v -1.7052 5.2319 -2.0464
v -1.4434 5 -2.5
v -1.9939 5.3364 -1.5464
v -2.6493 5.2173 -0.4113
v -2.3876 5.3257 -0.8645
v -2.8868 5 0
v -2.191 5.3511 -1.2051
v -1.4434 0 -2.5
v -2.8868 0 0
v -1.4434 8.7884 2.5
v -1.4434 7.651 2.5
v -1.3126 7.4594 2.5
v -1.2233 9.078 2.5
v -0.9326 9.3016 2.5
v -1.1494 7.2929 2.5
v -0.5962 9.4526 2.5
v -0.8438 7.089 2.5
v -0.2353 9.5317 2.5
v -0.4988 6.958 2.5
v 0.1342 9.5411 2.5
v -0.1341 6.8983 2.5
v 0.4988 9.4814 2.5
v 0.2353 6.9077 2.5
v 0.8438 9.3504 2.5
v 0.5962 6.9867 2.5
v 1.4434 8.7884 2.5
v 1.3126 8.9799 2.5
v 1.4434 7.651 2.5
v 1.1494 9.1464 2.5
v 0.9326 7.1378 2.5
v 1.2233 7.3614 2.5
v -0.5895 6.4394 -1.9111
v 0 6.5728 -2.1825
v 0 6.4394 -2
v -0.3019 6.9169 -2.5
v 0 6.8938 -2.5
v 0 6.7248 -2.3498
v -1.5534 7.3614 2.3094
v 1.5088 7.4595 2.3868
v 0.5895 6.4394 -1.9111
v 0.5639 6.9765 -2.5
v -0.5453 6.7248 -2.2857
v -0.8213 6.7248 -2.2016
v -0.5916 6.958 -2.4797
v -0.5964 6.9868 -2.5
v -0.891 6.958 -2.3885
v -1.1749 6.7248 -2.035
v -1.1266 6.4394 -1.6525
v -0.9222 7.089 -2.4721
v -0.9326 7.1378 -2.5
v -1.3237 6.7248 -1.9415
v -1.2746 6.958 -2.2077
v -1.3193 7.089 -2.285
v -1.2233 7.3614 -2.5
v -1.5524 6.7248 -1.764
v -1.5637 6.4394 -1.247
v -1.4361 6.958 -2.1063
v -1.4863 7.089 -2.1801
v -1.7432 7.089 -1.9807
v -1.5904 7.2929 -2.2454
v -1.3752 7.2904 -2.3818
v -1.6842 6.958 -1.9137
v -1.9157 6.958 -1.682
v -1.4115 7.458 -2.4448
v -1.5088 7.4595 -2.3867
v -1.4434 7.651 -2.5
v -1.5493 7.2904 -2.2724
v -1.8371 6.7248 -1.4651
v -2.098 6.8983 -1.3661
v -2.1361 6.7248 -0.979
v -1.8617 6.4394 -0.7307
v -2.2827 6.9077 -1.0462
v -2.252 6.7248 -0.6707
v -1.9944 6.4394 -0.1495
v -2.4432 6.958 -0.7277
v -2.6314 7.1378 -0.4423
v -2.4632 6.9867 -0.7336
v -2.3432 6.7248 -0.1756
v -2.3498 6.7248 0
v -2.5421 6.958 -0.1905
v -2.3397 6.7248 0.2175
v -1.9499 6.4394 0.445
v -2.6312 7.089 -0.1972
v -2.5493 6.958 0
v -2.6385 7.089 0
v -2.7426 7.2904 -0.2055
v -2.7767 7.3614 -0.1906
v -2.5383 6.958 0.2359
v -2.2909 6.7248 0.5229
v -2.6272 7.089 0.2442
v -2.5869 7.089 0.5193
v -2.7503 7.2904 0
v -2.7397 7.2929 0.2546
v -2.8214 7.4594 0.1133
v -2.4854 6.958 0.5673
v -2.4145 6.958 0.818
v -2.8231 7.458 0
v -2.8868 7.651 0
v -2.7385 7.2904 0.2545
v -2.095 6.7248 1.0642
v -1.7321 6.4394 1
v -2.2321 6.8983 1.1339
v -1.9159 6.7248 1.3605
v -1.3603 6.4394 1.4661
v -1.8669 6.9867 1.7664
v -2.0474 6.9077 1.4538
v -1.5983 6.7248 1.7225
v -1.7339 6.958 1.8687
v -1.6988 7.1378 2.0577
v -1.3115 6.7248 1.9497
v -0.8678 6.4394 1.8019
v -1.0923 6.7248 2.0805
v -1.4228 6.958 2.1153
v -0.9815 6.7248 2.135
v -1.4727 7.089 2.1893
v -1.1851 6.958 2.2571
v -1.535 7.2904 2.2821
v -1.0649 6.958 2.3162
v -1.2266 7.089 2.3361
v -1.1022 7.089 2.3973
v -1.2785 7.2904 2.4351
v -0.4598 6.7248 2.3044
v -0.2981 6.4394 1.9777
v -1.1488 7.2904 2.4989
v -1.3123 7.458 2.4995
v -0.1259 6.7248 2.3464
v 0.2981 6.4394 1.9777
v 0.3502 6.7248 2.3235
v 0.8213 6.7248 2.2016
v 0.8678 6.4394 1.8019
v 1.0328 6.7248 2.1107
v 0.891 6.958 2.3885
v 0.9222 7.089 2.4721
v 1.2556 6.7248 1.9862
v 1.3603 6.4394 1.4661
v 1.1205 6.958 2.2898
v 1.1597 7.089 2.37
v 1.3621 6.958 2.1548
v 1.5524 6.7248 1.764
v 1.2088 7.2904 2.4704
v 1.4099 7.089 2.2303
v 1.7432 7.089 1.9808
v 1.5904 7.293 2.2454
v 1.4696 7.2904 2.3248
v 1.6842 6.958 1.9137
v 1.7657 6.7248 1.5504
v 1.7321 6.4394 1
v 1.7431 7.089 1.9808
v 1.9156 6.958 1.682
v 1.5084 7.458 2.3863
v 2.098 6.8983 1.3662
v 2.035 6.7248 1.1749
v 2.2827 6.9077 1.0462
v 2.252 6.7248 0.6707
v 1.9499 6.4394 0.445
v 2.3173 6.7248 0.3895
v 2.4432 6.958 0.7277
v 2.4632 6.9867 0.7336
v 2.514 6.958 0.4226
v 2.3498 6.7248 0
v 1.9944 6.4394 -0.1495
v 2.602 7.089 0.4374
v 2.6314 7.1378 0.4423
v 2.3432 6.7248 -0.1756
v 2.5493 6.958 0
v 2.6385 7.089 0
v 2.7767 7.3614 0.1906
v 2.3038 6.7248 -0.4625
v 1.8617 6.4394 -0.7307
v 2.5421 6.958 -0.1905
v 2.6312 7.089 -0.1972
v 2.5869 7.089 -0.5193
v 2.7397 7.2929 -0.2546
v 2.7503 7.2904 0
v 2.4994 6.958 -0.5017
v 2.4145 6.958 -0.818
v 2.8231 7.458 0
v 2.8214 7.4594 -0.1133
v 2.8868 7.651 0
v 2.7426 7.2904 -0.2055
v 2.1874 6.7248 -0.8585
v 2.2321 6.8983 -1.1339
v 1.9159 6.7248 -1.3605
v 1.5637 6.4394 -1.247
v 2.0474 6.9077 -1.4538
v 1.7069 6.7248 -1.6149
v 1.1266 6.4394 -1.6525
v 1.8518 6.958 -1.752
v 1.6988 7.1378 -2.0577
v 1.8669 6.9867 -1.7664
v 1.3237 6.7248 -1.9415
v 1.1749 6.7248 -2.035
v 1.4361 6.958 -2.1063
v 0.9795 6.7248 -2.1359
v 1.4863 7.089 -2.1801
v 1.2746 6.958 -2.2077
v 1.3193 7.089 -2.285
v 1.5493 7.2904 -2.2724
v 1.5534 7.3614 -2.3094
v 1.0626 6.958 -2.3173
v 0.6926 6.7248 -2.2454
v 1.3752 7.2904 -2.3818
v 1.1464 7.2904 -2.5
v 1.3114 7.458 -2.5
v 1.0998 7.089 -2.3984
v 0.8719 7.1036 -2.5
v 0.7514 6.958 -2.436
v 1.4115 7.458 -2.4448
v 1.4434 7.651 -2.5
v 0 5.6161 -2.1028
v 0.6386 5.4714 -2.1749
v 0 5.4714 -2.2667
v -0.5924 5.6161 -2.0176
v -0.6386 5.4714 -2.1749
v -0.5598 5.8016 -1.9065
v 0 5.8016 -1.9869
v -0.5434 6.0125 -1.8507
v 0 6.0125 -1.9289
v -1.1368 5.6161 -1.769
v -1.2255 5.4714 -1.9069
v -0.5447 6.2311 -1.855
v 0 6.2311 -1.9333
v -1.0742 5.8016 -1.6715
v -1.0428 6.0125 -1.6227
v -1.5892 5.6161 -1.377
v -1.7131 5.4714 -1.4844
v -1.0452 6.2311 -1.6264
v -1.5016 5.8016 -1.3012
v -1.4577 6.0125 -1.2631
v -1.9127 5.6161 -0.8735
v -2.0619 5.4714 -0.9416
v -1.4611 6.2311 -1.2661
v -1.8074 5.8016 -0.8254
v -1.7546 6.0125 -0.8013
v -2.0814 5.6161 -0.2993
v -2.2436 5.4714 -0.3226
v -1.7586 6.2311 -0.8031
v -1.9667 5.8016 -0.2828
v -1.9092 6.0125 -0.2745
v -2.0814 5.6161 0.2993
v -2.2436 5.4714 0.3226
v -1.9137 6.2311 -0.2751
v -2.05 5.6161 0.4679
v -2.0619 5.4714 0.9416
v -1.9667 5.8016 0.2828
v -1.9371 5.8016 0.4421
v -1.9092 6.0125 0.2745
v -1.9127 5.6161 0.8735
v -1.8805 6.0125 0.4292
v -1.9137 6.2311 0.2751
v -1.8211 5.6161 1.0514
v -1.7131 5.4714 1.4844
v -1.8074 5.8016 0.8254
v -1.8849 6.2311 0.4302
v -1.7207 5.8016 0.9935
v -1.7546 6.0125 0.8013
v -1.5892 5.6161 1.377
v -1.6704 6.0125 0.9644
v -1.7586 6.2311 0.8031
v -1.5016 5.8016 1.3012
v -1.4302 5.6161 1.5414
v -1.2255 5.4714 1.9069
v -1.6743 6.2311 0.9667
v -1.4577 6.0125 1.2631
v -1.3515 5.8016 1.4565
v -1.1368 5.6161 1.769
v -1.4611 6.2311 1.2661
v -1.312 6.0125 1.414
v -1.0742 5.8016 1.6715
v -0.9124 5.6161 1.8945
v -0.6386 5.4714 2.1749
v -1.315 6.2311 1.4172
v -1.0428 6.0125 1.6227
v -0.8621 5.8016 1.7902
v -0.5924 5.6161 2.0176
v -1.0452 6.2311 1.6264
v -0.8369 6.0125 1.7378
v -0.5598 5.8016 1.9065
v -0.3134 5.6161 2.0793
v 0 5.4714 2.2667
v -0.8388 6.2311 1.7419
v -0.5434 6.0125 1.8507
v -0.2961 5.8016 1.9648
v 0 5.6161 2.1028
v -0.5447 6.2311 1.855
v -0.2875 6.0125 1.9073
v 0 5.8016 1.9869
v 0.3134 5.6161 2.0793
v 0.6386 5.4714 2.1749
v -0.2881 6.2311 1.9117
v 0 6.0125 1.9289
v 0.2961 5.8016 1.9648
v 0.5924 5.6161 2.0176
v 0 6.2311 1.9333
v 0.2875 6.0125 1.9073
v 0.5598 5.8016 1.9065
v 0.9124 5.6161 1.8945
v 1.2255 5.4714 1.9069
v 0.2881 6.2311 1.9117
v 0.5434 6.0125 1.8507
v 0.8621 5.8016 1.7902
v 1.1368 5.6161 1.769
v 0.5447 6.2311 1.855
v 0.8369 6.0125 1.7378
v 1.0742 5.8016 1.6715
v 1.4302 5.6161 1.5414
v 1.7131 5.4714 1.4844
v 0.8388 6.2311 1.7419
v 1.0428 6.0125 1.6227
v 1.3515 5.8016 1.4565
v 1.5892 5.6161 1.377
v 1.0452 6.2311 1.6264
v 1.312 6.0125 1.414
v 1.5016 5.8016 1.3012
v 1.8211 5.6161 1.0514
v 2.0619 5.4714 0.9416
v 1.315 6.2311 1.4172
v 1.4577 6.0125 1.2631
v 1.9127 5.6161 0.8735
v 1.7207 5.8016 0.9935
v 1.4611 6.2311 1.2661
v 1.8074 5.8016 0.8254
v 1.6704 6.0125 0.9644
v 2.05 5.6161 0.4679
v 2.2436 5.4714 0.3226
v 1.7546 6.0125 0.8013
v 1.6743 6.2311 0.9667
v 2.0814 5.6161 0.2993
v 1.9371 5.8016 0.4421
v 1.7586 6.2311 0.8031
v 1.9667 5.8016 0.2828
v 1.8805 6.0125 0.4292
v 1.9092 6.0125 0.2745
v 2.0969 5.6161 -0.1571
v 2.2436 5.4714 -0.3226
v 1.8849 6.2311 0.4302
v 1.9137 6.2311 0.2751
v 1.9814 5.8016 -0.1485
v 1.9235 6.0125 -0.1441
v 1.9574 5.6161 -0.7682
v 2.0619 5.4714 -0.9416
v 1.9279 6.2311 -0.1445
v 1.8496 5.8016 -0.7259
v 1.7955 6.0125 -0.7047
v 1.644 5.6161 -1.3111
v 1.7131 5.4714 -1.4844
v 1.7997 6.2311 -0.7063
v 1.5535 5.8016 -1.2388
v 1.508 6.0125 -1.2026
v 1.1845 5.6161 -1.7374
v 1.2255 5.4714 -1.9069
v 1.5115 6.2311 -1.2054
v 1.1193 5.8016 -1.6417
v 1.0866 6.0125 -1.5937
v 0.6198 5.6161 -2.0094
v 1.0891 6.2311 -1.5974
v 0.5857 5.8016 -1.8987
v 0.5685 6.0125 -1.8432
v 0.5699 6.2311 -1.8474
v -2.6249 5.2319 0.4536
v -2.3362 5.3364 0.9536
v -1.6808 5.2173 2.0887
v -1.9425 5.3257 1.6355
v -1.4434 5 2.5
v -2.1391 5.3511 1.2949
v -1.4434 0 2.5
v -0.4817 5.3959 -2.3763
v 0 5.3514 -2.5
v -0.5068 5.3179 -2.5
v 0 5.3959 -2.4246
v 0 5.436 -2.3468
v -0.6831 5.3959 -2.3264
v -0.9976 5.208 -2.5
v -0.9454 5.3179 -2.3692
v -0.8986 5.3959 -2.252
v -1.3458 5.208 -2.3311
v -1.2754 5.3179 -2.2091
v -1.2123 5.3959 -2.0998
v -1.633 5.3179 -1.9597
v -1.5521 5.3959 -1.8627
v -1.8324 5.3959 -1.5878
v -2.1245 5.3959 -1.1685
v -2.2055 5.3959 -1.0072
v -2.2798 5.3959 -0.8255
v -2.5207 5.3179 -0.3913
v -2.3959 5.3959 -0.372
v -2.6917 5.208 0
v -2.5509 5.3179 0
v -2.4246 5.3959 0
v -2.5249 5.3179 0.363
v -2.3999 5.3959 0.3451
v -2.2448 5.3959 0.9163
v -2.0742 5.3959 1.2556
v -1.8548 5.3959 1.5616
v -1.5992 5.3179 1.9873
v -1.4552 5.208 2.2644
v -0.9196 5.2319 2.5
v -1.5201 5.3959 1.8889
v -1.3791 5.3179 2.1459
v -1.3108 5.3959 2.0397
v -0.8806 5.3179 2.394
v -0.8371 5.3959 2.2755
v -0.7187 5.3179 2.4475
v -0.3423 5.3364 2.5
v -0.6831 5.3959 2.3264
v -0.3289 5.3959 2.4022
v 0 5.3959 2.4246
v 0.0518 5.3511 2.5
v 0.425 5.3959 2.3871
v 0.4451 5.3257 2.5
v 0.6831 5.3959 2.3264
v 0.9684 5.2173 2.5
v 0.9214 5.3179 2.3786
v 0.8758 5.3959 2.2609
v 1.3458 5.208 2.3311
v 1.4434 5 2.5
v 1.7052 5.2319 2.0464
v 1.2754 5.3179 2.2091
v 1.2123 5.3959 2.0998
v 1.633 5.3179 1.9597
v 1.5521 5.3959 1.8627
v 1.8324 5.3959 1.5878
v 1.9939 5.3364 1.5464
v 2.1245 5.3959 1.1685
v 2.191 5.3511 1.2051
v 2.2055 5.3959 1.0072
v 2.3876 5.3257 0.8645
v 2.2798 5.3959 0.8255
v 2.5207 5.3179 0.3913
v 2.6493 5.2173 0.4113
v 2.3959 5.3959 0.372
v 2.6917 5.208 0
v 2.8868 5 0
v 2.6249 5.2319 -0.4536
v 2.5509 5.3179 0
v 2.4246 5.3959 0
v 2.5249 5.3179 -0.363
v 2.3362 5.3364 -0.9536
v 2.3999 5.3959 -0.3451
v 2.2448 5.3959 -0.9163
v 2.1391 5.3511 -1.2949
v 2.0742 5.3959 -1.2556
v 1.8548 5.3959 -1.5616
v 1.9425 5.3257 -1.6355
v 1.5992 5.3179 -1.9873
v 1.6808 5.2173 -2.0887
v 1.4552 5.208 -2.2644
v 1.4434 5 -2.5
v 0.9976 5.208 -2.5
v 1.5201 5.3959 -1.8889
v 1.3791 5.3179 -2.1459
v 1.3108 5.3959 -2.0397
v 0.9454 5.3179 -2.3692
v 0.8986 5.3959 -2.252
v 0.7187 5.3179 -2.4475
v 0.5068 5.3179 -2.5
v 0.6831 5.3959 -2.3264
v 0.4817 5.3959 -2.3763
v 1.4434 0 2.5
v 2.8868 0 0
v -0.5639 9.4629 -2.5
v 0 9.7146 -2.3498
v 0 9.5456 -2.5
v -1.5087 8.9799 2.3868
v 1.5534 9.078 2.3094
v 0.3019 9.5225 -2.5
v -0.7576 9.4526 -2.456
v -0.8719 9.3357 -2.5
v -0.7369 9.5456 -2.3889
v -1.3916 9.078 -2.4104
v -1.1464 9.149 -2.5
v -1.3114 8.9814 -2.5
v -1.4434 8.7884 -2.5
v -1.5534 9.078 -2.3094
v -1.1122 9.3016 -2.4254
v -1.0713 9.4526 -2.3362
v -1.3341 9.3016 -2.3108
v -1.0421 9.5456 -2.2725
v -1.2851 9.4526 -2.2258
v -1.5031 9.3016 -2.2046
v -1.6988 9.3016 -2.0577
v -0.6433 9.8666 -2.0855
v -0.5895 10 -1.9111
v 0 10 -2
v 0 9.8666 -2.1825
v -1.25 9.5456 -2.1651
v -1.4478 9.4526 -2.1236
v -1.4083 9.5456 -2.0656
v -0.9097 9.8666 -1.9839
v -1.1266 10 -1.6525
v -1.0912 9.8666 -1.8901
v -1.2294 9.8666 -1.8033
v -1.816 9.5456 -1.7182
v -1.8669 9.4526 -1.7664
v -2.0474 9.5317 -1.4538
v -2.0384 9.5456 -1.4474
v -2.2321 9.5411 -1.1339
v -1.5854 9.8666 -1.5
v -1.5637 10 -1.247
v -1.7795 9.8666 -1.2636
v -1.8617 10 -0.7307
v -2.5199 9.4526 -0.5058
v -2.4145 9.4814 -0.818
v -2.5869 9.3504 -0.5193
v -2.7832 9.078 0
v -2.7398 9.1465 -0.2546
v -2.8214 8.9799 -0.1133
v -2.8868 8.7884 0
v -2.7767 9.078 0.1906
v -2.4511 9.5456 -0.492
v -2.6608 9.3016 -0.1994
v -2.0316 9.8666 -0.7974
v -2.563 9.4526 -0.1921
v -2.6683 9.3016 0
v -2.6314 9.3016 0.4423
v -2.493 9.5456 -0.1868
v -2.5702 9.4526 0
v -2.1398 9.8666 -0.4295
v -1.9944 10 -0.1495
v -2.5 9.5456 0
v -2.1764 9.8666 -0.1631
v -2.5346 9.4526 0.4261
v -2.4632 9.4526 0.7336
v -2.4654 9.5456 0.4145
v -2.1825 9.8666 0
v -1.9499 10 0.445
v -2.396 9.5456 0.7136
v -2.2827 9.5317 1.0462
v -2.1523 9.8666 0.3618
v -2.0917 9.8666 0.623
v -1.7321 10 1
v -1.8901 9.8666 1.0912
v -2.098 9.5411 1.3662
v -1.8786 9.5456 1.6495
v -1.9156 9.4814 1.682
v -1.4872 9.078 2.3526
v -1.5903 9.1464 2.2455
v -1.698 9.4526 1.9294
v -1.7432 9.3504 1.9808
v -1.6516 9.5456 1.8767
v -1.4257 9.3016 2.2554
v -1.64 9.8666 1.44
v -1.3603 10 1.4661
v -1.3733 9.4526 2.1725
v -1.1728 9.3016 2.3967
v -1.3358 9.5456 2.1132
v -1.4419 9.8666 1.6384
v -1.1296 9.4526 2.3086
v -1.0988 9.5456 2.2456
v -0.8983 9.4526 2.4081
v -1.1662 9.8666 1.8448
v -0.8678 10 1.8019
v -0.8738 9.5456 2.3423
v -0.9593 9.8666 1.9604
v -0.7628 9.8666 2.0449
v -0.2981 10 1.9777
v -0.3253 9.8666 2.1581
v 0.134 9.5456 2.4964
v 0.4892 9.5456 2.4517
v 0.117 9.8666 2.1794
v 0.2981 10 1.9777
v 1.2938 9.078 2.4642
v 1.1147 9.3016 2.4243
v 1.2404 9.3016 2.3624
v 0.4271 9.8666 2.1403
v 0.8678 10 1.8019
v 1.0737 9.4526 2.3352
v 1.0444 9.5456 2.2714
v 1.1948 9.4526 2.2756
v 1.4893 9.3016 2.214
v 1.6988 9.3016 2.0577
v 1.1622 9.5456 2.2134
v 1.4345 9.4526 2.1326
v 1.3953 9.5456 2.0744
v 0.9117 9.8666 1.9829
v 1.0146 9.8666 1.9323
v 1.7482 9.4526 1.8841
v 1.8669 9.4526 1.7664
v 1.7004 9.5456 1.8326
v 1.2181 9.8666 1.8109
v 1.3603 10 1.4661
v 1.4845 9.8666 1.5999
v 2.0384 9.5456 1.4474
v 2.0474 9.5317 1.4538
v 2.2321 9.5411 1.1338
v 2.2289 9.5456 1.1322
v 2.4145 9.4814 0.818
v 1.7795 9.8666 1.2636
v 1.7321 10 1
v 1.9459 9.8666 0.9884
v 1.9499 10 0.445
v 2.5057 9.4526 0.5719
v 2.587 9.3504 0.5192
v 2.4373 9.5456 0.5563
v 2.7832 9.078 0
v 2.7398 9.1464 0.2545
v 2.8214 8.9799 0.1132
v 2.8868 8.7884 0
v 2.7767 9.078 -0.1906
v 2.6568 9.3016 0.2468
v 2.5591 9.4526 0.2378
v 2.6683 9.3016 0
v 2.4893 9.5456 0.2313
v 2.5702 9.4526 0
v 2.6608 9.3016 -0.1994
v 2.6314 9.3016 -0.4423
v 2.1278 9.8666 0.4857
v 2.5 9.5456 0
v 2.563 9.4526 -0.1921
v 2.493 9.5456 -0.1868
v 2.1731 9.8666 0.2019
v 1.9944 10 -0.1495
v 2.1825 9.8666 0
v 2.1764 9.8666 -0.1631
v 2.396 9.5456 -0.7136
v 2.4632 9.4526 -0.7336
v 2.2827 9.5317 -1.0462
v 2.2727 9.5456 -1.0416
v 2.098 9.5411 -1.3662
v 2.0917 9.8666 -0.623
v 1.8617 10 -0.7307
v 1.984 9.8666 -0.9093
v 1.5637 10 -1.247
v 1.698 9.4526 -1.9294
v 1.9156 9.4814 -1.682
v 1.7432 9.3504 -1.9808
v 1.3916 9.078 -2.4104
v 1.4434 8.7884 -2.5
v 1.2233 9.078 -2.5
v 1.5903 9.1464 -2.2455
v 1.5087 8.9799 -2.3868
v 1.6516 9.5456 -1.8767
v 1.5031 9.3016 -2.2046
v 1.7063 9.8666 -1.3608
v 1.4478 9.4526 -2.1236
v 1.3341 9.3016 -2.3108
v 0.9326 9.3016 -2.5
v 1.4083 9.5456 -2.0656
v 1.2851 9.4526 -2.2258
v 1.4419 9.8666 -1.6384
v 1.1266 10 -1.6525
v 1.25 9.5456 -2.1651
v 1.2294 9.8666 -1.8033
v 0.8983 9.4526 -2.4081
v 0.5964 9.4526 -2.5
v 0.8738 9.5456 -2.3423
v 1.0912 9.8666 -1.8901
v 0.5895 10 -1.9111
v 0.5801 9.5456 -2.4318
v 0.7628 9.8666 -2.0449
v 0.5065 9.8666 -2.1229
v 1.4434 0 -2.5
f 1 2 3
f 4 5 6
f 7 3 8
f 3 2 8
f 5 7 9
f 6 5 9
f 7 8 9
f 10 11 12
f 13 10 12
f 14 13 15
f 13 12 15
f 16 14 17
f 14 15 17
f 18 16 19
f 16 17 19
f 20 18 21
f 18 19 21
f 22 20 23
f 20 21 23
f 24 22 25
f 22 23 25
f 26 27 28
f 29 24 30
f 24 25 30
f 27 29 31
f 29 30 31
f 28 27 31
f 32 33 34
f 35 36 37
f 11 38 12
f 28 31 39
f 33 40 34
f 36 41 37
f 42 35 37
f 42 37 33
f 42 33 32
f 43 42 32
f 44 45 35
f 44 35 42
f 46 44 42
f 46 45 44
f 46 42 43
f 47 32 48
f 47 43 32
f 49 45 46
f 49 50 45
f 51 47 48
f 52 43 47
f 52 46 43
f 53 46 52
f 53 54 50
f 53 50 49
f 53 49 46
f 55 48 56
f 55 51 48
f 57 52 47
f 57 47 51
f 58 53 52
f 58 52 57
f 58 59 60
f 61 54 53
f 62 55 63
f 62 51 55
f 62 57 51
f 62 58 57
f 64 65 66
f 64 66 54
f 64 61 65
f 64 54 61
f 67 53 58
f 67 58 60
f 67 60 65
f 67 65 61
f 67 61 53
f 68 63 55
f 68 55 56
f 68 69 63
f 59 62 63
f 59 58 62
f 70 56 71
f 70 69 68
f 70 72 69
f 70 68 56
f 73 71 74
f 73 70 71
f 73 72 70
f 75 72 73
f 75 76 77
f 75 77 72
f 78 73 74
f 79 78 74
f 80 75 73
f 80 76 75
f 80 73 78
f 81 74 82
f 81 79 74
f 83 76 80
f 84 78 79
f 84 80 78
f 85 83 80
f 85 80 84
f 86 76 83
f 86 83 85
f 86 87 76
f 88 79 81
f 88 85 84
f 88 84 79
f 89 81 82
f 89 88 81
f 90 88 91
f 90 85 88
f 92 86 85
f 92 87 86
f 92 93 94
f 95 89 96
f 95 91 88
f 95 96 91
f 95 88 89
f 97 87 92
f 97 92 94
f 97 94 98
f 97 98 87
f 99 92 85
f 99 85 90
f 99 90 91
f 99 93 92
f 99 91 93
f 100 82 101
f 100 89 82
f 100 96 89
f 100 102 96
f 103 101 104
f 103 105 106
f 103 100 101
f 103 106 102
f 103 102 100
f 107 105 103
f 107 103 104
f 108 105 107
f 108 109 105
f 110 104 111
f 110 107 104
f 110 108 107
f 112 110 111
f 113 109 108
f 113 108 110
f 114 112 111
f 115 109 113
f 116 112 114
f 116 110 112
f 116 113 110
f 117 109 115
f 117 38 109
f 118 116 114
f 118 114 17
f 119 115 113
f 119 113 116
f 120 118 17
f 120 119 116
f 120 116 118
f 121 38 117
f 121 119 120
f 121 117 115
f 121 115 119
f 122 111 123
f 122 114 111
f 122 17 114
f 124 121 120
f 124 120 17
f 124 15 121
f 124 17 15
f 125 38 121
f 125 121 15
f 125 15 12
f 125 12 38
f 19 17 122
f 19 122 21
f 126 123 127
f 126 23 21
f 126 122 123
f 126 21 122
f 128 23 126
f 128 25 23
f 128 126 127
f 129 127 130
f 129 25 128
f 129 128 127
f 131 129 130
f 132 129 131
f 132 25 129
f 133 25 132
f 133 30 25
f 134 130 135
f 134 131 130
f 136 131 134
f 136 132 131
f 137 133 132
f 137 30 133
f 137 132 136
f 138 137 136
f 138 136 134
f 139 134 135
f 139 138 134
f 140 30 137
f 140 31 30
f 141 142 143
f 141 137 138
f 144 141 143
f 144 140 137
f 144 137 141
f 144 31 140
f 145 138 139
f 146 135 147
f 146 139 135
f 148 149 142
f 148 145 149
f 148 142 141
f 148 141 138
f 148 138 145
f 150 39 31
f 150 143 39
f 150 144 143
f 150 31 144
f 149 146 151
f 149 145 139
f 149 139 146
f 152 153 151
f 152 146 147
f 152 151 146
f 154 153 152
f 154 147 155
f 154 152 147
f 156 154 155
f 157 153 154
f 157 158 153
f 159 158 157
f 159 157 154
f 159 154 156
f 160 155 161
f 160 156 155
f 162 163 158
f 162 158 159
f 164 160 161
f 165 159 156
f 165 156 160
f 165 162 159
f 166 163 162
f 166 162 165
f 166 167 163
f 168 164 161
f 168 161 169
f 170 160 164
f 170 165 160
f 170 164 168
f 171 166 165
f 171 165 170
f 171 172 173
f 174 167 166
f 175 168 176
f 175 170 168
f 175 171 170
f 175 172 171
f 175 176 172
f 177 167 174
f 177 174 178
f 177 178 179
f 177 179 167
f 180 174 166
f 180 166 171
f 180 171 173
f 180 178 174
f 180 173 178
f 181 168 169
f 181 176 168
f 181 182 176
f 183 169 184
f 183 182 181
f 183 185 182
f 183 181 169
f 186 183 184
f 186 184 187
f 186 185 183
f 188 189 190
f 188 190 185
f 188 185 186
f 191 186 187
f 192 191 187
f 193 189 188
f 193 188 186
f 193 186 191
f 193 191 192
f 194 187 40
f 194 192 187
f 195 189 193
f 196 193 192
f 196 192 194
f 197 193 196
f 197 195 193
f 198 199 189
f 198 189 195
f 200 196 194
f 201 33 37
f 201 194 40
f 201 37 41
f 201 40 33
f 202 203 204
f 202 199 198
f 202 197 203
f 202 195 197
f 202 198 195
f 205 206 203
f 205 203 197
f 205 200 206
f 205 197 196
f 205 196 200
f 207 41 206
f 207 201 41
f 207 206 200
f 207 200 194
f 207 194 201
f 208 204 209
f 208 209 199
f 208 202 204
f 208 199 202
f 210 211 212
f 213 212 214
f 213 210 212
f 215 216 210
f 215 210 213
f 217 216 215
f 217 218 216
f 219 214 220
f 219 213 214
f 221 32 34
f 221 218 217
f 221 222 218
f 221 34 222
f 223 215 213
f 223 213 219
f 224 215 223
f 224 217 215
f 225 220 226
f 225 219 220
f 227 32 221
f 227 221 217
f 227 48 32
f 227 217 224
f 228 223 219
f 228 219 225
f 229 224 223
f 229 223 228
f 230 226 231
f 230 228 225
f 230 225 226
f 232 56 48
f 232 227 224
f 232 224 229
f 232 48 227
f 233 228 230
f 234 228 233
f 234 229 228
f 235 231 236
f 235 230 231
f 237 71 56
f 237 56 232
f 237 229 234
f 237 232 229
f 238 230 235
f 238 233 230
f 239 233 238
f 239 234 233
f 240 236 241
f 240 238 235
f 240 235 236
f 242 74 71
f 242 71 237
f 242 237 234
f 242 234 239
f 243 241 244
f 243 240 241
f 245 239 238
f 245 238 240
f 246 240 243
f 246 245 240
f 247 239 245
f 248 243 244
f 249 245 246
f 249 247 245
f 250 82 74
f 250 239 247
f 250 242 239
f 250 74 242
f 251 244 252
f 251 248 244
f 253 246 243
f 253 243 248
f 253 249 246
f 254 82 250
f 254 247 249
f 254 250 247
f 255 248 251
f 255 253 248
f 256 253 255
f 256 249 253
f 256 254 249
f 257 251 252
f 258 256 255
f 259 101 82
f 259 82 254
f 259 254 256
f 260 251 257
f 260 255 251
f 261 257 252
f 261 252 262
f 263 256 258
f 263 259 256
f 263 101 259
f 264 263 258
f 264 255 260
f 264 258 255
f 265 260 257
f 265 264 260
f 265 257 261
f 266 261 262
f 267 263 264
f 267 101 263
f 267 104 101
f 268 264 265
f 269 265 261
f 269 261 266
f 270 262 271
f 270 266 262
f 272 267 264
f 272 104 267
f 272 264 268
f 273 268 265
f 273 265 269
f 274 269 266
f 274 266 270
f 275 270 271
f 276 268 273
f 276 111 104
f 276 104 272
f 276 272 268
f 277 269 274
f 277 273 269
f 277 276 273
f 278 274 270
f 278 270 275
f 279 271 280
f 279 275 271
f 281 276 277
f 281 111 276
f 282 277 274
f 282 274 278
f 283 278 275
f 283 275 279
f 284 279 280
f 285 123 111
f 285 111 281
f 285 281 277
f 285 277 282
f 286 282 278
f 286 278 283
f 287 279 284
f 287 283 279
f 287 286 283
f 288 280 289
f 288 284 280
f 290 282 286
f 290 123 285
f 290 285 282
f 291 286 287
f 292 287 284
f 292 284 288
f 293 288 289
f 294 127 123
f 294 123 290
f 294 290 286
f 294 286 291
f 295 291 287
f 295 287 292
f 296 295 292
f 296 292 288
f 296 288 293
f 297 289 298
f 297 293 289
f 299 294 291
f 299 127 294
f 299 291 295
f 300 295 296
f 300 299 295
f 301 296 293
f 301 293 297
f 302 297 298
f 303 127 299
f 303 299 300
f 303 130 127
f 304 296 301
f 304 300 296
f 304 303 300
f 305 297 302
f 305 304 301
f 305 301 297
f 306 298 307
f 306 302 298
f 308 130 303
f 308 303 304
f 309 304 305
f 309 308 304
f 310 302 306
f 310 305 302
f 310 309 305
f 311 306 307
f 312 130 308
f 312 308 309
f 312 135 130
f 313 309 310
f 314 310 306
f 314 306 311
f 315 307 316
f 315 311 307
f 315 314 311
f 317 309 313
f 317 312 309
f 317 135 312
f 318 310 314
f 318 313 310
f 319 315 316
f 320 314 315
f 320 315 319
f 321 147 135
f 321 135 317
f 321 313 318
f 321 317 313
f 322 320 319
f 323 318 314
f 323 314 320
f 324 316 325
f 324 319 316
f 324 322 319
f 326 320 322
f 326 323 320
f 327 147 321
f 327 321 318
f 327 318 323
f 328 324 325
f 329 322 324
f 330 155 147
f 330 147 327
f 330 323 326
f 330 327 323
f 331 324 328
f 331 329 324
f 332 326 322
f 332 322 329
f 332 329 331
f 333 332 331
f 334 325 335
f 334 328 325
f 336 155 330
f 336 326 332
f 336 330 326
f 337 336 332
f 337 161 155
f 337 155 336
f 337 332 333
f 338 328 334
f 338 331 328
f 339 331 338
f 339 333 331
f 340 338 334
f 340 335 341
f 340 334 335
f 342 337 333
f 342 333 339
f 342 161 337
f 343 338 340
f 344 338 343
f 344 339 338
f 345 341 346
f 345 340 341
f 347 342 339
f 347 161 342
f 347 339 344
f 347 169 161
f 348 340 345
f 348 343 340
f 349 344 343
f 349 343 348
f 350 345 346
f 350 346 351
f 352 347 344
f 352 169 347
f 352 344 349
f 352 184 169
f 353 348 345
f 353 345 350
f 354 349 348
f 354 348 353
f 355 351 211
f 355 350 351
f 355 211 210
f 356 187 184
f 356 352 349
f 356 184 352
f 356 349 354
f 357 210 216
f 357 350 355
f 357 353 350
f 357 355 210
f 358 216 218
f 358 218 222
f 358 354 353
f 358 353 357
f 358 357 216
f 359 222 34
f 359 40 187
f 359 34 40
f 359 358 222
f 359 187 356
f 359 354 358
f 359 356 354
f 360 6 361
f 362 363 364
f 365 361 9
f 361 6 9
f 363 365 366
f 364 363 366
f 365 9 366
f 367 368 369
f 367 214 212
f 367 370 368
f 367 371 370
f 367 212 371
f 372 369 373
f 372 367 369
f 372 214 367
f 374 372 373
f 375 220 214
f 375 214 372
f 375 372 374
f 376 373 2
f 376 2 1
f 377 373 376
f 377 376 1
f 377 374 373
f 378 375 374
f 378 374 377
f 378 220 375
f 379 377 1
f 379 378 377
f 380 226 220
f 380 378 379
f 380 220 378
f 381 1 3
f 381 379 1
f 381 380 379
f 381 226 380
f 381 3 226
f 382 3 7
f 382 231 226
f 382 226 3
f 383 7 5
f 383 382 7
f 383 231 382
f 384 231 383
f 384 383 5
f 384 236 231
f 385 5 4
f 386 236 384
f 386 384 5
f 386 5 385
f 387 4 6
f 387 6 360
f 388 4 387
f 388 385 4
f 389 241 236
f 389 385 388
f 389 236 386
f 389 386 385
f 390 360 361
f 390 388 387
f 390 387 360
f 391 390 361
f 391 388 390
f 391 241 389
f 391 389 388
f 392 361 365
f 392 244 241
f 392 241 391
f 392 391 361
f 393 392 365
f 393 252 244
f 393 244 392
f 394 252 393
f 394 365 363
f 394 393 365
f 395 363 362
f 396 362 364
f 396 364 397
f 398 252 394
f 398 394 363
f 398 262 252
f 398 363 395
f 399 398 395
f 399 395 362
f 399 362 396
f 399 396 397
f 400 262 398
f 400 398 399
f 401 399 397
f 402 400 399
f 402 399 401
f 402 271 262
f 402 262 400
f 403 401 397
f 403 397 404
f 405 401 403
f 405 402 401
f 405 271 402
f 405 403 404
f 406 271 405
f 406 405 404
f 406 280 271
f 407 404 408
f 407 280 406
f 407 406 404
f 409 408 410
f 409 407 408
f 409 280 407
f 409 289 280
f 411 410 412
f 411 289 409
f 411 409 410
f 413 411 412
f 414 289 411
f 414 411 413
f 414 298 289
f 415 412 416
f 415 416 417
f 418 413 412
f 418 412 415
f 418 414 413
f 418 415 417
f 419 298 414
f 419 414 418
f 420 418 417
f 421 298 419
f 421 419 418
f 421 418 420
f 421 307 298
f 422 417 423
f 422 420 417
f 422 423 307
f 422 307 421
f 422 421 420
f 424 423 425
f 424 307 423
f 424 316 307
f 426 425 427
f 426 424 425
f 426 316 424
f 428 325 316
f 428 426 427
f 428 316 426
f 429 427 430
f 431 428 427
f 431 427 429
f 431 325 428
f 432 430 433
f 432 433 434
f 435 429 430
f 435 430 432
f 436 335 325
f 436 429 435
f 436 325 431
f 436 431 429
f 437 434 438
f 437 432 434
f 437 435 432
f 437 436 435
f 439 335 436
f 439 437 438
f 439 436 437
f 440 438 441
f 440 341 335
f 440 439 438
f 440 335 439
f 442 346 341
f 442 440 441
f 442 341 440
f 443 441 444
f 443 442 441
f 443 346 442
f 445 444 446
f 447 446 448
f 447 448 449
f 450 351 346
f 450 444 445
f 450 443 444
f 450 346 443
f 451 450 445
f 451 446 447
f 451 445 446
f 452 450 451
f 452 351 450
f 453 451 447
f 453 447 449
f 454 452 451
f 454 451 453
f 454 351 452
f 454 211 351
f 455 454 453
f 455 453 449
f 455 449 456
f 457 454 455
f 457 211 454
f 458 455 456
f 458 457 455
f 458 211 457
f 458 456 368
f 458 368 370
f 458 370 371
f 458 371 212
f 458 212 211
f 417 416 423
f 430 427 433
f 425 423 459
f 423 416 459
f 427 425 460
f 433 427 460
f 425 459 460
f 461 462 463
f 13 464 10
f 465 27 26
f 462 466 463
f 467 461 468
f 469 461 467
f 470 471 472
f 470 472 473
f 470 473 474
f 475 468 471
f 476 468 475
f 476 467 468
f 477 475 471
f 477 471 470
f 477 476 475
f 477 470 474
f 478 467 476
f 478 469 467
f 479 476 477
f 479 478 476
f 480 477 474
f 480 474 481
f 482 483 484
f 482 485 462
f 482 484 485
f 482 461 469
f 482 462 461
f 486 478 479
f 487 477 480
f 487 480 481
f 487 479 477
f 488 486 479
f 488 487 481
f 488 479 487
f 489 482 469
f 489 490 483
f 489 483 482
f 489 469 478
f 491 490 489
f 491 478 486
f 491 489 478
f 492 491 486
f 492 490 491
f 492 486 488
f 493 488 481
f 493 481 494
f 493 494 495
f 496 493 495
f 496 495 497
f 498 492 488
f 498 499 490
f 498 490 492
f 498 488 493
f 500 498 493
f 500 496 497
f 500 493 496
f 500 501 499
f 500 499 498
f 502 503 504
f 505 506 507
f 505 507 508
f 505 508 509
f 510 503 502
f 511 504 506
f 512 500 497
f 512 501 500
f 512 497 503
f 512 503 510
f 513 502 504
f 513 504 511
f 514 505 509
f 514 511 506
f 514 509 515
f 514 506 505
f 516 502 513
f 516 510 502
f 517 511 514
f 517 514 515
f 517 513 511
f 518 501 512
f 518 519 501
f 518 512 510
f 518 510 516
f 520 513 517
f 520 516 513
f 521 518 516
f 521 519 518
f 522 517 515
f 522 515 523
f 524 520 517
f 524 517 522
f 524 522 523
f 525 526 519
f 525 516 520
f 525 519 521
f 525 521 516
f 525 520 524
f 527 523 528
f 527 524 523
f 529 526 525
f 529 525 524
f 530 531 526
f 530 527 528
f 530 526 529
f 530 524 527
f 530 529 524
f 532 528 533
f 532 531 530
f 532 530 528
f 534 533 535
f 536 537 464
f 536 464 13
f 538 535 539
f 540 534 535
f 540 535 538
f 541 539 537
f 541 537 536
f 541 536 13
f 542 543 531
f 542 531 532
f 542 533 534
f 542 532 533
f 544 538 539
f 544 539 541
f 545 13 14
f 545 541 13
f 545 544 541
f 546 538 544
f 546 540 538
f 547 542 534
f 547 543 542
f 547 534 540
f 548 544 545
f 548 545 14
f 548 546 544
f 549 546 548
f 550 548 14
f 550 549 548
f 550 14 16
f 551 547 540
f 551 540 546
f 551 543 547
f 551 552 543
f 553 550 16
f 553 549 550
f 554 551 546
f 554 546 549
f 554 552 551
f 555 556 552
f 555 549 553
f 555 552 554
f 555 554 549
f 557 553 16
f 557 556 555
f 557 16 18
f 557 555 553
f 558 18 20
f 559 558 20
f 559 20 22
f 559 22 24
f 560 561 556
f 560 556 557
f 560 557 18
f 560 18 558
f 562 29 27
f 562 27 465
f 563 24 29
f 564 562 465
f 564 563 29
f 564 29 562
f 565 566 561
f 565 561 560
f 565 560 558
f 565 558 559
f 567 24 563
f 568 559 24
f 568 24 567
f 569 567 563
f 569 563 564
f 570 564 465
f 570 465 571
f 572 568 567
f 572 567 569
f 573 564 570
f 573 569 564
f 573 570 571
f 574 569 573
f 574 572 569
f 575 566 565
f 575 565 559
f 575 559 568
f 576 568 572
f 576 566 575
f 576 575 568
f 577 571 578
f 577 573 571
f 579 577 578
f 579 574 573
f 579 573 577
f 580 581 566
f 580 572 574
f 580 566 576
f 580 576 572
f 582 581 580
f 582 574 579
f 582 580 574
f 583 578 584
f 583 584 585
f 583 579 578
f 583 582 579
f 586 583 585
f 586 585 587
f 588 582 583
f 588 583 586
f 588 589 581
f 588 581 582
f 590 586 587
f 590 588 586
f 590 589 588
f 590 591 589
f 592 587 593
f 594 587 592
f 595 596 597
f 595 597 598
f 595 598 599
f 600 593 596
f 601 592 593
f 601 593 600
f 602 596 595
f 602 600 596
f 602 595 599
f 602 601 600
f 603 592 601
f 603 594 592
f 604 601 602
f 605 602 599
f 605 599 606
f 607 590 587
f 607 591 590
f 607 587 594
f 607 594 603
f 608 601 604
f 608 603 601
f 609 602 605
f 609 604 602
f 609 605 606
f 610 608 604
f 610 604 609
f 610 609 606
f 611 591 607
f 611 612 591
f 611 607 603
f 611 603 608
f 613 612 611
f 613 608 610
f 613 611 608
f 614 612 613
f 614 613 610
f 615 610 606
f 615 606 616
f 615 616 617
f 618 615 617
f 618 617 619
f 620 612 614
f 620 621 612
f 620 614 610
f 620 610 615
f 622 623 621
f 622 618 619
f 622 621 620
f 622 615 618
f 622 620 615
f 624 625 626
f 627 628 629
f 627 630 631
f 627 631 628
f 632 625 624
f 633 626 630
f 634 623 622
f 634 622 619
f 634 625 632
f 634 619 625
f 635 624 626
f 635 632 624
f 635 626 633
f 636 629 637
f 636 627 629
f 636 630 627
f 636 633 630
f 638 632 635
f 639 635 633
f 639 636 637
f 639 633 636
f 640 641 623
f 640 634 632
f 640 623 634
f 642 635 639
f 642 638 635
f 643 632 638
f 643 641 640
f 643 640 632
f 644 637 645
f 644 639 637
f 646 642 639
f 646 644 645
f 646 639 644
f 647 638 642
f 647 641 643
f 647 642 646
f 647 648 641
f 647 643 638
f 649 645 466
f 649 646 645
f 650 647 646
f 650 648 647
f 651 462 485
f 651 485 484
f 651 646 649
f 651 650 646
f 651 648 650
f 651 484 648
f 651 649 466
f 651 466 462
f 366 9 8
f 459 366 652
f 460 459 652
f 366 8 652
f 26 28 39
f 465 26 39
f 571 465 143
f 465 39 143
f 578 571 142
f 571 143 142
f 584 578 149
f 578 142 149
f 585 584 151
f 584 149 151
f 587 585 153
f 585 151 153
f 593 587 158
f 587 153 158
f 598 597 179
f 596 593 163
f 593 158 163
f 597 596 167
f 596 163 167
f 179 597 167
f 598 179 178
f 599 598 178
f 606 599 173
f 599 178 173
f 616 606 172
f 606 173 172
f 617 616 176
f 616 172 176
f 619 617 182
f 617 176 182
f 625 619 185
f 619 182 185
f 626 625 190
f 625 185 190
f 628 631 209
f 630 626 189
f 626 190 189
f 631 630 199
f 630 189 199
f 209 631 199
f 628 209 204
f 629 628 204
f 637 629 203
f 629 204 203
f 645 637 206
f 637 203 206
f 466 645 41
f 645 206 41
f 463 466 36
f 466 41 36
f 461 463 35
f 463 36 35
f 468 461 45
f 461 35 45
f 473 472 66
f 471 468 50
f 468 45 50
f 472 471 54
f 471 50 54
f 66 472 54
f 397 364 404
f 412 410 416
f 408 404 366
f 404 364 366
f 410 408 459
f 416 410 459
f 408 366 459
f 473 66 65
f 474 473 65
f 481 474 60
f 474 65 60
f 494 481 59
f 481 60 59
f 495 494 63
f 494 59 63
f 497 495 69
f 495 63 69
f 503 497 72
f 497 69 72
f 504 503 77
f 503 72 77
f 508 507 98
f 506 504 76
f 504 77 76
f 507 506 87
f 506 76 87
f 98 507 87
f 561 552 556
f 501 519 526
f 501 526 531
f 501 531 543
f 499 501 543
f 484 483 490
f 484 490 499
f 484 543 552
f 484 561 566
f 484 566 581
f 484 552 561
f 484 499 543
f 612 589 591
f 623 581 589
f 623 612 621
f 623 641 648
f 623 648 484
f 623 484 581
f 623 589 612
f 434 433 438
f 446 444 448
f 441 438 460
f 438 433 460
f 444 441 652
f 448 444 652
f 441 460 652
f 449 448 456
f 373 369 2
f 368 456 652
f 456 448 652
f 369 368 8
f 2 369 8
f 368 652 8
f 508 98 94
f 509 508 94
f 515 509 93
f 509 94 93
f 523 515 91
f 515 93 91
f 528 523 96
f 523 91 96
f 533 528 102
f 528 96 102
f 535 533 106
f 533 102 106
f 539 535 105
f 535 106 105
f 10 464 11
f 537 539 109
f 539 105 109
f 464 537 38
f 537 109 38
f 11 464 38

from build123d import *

# Parameters (mm, degrees)
BOSS_EXTRUDE1_DEPTH = 10


with BuildPart() as part:
    # Sketch1 → Boss-Extrude1 (new body)
    with BuildSketch(Plane(origin=(0, 0, 0), x_dir=(1, 0, 0), z_dir=(0, 1, 0))):
        Polygon((2.886751346, 0), (1.443375673, 2.5), (-1.443375673, 2.5), (-2.886751346, 0), (-1.443375673, -2.5), (1.443375673, -2.5), align=None)
    extrude(amount=BOSS_EXTRUDE1_DEPTH)

    # Sketch3 → Cut-Revolve1 (revolve, cut)
    with BuildSketch(Plane.XY, mode=Mode.PRIVATE) as cut_revolve1_sk:
        with BuildLine():
            Line((-2, 10), (-2, 10.901570298))
            Line((-2, 10.901570298), (-4.378417403, 10.901570298))
            Line((-4.378417403, 10.901570298), (-4.378417403, 5))
            Line((-4.378417403, 5), (-2.886751346, 5))
            ThreePointArc((-2.886751346, 5), (-2.607836376, 5.276622353), (-2.266701974, 5.471406351))
            ThreePointArc((-2.266701974, 5.471406351), (-1.950264944, 5.90495326), (-2, 6.439389168))
            ThreePointArc((-2, 6.439389168), (-2.964233791, 8.219694584), (-2, 10))
        make_face()
    revolve(cut_revolve1_sk.sketch.rotate(Axis((0, -0.795078515, 0), (0, 1, 0)), 270), axis=Axis((0, -0.795078515, 0), (0, 1, 0)), mode=Mode.SUBTRACT)


solid = part.part
